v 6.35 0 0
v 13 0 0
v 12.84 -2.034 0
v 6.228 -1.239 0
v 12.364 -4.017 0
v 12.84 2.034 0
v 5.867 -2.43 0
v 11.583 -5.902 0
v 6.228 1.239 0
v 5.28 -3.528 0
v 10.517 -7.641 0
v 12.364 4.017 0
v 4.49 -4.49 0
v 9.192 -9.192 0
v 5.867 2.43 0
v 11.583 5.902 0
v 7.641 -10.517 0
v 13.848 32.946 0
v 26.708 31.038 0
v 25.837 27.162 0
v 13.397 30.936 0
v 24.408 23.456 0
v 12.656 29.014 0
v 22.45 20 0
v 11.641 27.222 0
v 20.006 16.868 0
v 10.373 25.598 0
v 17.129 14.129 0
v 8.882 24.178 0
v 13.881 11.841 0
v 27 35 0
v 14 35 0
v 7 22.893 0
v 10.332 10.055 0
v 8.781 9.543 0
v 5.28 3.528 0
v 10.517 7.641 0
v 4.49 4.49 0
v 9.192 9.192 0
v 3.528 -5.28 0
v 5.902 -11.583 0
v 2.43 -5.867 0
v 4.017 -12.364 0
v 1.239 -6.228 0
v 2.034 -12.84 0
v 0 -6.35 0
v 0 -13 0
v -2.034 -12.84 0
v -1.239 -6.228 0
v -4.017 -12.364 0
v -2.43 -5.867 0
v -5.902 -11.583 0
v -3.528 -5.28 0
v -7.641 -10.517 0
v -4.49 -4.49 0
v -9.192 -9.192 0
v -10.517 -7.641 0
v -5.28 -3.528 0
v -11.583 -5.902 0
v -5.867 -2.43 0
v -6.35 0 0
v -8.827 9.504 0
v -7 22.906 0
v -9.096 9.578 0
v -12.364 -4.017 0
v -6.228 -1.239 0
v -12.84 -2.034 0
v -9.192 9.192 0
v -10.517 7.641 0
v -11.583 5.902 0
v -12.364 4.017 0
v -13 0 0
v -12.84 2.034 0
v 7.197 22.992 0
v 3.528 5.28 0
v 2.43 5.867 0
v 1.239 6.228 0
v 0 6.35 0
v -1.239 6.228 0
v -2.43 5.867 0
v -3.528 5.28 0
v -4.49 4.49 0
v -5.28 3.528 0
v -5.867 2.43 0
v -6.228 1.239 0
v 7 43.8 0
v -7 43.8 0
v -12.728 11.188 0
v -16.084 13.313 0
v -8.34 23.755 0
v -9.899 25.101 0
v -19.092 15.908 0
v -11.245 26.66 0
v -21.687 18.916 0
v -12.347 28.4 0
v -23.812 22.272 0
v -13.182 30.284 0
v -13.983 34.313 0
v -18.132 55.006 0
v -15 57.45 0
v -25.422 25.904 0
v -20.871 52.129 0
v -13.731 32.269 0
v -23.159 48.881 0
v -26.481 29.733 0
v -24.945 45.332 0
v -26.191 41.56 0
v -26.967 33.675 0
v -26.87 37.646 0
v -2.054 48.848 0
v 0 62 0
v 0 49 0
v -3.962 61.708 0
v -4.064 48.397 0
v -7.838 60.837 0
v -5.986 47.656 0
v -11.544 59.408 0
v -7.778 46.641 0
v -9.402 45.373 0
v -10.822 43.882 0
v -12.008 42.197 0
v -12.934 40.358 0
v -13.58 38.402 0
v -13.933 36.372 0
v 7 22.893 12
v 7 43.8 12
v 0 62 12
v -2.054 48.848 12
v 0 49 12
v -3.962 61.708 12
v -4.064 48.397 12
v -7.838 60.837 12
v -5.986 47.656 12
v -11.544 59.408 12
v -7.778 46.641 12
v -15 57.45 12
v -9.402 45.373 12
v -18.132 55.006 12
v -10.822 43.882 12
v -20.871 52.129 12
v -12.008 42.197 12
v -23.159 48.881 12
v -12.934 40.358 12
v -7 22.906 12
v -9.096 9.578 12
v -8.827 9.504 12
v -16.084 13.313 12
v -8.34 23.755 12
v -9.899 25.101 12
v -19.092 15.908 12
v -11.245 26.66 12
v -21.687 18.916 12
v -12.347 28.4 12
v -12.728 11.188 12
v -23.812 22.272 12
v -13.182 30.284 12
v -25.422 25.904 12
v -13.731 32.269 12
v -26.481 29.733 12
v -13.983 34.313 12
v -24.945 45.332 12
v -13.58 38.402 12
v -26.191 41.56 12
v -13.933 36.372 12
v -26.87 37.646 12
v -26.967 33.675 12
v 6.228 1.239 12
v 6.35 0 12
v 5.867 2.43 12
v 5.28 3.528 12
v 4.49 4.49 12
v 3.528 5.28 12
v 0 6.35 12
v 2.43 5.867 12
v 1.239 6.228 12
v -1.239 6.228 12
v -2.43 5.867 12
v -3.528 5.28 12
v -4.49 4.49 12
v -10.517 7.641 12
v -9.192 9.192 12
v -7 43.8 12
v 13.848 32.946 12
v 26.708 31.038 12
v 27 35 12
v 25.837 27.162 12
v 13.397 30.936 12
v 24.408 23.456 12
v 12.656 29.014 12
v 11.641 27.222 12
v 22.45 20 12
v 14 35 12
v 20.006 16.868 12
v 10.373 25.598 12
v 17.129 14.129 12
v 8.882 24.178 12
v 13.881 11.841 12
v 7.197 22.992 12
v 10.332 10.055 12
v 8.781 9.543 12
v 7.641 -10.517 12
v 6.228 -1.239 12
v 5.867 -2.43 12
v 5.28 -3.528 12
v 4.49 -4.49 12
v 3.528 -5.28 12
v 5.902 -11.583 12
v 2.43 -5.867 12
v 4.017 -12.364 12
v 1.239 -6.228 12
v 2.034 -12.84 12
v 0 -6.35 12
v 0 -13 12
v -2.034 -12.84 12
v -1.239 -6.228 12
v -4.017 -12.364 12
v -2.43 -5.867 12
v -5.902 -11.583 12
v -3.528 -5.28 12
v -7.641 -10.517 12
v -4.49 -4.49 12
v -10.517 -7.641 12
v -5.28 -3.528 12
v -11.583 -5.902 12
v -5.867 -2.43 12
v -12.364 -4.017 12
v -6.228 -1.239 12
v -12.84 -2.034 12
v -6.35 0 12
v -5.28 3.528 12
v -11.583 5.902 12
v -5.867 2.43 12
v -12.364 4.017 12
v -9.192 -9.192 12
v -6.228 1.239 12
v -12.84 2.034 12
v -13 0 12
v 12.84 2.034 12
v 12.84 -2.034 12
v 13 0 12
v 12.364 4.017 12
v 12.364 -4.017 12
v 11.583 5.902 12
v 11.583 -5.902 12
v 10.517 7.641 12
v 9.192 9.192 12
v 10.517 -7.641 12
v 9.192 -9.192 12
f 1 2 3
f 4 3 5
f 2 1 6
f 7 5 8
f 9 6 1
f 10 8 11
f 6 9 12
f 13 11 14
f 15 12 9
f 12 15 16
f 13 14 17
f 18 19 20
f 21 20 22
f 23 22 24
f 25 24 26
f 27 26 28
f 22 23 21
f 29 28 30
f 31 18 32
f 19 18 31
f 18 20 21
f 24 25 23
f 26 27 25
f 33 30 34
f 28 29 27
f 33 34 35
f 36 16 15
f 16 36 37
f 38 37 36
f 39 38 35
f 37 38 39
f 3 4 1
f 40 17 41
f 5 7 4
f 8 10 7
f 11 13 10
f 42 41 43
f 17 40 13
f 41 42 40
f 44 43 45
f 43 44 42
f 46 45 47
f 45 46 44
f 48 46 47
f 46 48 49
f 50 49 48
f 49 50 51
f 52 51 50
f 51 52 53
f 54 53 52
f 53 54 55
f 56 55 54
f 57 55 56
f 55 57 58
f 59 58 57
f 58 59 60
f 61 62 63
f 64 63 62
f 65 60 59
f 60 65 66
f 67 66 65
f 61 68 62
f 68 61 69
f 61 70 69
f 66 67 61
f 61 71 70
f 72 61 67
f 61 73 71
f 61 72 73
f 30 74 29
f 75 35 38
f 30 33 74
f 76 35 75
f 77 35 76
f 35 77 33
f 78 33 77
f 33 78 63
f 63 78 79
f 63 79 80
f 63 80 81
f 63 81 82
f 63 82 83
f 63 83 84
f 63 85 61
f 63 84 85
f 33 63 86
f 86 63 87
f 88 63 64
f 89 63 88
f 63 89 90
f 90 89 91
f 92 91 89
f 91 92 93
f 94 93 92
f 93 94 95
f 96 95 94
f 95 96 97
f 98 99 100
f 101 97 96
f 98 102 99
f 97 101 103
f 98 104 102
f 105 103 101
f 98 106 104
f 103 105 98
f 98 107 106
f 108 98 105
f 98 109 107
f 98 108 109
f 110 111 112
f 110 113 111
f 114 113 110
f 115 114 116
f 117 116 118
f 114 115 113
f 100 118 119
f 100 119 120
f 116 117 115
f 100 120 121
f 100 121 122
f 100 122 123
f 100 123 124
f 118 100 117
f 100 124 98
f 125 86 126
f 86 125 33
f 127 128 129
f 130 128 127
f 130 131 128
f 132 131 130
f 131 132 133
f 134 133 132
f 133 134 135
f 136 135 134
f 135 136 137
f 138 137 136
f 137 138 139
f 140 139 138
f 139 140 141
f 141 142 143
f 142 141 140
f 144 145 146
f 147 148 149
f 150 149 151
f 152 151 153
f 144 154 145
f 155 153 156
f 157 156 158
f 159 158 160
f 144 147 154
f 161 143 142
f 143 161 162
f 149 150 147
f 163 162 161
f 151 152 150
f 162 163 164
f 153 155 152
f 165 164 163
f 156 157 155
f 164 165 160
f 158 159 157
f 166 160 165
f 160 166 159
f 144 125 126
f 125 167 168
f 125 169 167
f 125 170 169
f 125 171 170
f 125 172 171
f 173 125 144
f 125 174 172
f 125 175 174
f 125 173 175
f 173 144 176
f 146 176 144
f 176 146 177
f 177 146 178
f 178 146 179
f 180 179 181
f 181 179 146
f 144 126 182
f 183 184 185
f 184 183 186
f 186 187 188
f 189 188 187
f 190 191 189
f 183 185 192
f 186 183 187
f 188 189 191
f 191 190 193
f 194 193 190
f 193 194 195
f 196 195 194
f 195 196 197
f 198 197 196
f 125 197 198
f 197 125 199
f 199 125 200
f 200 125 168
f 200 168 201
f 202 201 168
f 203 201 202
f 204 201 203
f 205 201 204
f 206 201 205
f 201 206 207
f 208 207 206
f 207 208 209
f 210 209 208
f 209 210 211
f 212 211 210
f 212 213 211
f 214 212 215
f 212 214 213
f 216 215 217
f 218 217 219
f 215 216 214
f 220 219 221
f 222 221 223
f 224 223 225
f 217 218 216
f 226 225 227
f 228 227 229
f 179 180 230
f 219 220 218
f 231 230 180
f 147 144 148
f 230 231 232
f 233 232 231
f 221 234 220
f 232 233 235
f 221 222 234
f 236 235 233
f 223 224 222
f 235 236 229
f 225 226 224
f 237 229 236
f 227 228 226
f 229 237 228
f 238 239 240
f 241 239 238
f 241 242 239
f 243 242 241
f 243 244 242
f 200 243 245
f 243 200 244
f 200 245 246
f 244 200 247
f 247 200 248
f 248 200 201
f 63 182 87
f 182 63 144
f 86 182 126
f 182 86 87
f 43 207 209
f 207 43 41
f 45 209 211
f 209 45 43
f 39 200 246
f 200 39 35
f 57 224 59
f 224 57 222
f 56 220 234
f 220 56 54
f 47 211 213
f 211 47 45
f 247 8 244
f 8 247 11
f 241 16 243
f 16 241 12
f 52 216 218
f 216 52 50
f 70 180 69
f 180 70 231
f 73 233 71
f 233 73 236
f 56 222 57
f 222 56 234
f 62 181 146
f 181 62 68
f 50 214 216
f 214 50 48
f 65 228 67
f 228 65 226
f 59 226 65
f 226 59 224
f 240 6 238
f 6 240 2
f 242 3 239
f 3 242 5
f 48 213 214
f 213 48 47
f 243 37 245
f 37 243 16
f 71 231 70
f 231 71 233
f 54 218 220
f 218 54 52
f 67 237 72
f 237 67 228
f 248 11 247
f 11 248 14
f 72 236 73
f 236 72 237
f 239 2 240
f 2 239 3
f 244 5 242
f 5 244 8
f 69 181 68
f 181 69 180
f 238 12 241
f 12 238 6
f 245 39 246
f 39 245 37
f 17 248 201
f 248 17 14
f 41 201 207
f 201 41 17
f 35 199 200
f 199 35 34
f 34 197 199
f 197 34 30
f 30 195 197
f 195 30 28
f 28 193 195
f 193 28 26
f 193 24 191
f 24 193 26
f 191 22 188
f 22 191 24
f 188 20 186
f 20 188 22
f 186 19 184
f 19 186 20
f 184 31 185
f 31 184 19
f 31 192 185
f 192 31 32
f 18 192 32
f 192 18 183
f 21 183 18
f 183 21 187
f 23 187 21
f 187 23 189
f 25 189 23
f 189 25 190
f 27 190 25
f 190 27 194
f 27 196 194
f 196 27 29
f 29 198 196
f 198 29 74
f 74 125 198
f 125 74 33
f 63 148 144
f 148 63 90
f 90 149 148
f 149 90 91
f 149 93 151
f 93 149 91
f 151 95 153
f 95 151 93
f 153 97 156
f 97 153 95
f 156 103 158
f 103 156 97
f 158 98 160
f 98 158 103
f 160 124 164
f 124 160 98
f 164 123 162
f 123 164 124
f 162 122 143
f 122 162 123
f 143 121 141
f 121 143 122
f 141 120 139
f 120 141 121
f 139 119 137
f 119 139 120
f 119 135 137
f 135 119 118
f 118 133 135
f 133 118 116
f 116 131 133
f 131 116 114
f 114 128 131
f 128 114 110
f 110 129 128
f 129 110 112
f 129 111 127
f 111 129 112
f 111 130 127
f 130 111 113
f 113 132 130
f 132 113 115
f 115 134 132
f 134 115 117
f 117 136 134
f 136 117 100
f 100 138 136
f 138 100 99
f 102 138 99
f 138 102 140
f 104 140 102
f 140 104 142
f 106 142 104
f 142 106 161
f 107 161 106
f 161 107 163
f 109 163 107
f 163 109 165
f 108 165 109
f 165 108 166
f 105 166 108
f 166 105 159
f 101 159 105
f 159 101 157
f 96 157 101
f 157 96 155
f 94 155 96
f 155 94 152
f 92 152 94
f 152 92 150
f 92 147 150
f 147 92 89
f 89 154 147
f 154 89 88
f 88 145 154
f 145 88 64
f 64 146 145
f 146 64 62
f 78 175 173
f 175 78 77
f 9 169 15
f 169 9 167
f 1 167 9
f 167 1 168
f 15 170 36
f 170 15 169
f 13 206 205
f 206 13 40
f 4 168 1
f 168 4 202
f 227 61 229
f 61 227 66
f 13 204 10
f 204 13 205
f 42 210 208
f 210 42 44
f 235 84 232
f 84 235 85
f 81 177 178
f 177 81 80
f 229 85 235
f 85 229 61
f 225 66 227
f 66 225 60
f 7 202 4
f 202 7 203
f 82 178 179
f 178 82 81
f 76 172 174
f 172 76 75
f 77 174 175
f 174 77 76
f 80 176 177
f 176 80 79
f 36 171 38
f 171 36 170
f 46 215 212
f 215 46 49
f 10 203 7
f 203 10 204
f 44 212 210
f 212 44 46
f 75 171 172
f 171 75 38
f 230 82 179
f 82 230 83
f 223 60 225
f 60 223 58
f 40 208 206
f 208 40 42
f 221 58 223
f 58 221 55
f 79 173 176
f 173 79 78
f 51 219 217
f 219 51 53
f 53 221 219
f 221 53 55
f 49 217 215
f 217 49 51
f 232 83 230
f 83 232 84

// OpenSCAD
$fn = 32;

// ----------------------------------------------------------------------
// Hook: 70 mm shank into a 14 mm curl, 12 mm thick
// ----------------------------------------------------------------------

// --- parameters (mm) ---
shank_len = 70;           // shank length from the boss centre
shank_w = 14;             // shank width
boss_d = 26;              // boss diameter
bore_d = 12.7;            // boss bore
curl_in = 14;             // curl inner radius
curl_out = 27;            // curl outer radius
curl_sweep = 270;         // curl sweep angle
hook_t = 12;              // hook thickness

shank_profile = [[-7, 43.8], [7, 43.8], [7, 11], [-7, 11]];
boss_profile = [[13, 0], [12.84, 2.034], [12.364, 4.017], [11.583, 5.902], [10.517, 7.641], [9.192, 9.192], [7.641, 10.517], [5.902, 11.583], [4.017, 12.364], [2.034, 12.84], [0, 13], [-2.034, 12.84], [-4.017, 12.364], [-5.902, 11.583], [-7.641, 10.517], [-9.192, 9.192], [-10.517, 7.641], [-11.583, 5.902], [-12.364, 4.017], [-12.84, 2.034], [-13, 0], [-12.84, -2.034], [-12.364, -4.017], [-11.583, -5.902], [-10.517, -7.641], [-9.192, -9.192], [-7.641, -10.517], [-5.902, -11.583], [-4.017, -12.364], [-2.034, -12.84], [0, -13], [2.034, -12.84], [4.017, -12.364], [5.902, -11.583], [7.641, -10.517], [9.192, -9.192], [10.517, -7.641], [11.583, -5.902], [12.364, -4.017], [12.84, -2.034]];
curl_profile = [[0, 62], [-3.962, 61.708], [-7.838, 60.837], [-11.544, 59.408], [-15, 57.45], [-18.132, 55.006], [-20.871, 52.129], [-23.159, 48.881], [-24.945, 45.332], [-26.191, 41.56], [-26.87, 37.646], [-26.967, 33.675], [-26.481, 29.733], [-25.422, 25.904], [-23.812, 22.272], [-21.687, 18.916], [-19.092, 15.908], [-16.084, 13.313], [-12.728, 11.188], [-9.096, 9.578], [-5.267, 8.519], [-1.325, 8.033], [2.646, 8.13], [6.56, 8.809], [10.332, 10.055], [13.881, 11.841], [17.129, 14.129], [20.006, 16.868], [22.45, 20], [24.408, 23.456], [25.837, 27.162], [26.708, 31.038], [27, 35], [14, 35], [13.848, 32.946], [13.397, 30.936], [12.656, 29.014], [11.641, 27.222], [10.373, 25.598], [8.882, 24.178], [7.197, 22.992], [5.358, 22.066], [3.402, 21.42], [1.372, 21.067], [-0.687, 21.017], [-2.731, 21.269], [-4.716, 21.818], [-6.6, 22.653], [-8.34, 23.755], [-9.899, 25.101], [-11.245, 26.66], [-12.347, 28.4], [-13.182, 30.284], [-13.731, 32.269], [-13.983, 34.313], [-13.933, 36.372], [-13.58, 38.402], [-12.934, 40.358], [-12.008, 42.197], [-10.822, 43.882], [-9.402, 45.373], [-7.778, 46.641], [-5.986, 47.656], [-4.064, 48.397], [-2.054, 48.848], [0, 49]];

difference() {
  union() {
    /* three overlapping outlines: shank, boss and the smooth curl */
    linear_extrude(height = hook_t) polygon(shank_profile);
    linear_extrude(height = hook_t) polygon(boss_profile);
    linear_extrude(height = hook_t) polygon(curl_profile);
  }
  translate([0, 0, -2.5]) cylinder(h = hook_t + 5, d = bore_d);
}
